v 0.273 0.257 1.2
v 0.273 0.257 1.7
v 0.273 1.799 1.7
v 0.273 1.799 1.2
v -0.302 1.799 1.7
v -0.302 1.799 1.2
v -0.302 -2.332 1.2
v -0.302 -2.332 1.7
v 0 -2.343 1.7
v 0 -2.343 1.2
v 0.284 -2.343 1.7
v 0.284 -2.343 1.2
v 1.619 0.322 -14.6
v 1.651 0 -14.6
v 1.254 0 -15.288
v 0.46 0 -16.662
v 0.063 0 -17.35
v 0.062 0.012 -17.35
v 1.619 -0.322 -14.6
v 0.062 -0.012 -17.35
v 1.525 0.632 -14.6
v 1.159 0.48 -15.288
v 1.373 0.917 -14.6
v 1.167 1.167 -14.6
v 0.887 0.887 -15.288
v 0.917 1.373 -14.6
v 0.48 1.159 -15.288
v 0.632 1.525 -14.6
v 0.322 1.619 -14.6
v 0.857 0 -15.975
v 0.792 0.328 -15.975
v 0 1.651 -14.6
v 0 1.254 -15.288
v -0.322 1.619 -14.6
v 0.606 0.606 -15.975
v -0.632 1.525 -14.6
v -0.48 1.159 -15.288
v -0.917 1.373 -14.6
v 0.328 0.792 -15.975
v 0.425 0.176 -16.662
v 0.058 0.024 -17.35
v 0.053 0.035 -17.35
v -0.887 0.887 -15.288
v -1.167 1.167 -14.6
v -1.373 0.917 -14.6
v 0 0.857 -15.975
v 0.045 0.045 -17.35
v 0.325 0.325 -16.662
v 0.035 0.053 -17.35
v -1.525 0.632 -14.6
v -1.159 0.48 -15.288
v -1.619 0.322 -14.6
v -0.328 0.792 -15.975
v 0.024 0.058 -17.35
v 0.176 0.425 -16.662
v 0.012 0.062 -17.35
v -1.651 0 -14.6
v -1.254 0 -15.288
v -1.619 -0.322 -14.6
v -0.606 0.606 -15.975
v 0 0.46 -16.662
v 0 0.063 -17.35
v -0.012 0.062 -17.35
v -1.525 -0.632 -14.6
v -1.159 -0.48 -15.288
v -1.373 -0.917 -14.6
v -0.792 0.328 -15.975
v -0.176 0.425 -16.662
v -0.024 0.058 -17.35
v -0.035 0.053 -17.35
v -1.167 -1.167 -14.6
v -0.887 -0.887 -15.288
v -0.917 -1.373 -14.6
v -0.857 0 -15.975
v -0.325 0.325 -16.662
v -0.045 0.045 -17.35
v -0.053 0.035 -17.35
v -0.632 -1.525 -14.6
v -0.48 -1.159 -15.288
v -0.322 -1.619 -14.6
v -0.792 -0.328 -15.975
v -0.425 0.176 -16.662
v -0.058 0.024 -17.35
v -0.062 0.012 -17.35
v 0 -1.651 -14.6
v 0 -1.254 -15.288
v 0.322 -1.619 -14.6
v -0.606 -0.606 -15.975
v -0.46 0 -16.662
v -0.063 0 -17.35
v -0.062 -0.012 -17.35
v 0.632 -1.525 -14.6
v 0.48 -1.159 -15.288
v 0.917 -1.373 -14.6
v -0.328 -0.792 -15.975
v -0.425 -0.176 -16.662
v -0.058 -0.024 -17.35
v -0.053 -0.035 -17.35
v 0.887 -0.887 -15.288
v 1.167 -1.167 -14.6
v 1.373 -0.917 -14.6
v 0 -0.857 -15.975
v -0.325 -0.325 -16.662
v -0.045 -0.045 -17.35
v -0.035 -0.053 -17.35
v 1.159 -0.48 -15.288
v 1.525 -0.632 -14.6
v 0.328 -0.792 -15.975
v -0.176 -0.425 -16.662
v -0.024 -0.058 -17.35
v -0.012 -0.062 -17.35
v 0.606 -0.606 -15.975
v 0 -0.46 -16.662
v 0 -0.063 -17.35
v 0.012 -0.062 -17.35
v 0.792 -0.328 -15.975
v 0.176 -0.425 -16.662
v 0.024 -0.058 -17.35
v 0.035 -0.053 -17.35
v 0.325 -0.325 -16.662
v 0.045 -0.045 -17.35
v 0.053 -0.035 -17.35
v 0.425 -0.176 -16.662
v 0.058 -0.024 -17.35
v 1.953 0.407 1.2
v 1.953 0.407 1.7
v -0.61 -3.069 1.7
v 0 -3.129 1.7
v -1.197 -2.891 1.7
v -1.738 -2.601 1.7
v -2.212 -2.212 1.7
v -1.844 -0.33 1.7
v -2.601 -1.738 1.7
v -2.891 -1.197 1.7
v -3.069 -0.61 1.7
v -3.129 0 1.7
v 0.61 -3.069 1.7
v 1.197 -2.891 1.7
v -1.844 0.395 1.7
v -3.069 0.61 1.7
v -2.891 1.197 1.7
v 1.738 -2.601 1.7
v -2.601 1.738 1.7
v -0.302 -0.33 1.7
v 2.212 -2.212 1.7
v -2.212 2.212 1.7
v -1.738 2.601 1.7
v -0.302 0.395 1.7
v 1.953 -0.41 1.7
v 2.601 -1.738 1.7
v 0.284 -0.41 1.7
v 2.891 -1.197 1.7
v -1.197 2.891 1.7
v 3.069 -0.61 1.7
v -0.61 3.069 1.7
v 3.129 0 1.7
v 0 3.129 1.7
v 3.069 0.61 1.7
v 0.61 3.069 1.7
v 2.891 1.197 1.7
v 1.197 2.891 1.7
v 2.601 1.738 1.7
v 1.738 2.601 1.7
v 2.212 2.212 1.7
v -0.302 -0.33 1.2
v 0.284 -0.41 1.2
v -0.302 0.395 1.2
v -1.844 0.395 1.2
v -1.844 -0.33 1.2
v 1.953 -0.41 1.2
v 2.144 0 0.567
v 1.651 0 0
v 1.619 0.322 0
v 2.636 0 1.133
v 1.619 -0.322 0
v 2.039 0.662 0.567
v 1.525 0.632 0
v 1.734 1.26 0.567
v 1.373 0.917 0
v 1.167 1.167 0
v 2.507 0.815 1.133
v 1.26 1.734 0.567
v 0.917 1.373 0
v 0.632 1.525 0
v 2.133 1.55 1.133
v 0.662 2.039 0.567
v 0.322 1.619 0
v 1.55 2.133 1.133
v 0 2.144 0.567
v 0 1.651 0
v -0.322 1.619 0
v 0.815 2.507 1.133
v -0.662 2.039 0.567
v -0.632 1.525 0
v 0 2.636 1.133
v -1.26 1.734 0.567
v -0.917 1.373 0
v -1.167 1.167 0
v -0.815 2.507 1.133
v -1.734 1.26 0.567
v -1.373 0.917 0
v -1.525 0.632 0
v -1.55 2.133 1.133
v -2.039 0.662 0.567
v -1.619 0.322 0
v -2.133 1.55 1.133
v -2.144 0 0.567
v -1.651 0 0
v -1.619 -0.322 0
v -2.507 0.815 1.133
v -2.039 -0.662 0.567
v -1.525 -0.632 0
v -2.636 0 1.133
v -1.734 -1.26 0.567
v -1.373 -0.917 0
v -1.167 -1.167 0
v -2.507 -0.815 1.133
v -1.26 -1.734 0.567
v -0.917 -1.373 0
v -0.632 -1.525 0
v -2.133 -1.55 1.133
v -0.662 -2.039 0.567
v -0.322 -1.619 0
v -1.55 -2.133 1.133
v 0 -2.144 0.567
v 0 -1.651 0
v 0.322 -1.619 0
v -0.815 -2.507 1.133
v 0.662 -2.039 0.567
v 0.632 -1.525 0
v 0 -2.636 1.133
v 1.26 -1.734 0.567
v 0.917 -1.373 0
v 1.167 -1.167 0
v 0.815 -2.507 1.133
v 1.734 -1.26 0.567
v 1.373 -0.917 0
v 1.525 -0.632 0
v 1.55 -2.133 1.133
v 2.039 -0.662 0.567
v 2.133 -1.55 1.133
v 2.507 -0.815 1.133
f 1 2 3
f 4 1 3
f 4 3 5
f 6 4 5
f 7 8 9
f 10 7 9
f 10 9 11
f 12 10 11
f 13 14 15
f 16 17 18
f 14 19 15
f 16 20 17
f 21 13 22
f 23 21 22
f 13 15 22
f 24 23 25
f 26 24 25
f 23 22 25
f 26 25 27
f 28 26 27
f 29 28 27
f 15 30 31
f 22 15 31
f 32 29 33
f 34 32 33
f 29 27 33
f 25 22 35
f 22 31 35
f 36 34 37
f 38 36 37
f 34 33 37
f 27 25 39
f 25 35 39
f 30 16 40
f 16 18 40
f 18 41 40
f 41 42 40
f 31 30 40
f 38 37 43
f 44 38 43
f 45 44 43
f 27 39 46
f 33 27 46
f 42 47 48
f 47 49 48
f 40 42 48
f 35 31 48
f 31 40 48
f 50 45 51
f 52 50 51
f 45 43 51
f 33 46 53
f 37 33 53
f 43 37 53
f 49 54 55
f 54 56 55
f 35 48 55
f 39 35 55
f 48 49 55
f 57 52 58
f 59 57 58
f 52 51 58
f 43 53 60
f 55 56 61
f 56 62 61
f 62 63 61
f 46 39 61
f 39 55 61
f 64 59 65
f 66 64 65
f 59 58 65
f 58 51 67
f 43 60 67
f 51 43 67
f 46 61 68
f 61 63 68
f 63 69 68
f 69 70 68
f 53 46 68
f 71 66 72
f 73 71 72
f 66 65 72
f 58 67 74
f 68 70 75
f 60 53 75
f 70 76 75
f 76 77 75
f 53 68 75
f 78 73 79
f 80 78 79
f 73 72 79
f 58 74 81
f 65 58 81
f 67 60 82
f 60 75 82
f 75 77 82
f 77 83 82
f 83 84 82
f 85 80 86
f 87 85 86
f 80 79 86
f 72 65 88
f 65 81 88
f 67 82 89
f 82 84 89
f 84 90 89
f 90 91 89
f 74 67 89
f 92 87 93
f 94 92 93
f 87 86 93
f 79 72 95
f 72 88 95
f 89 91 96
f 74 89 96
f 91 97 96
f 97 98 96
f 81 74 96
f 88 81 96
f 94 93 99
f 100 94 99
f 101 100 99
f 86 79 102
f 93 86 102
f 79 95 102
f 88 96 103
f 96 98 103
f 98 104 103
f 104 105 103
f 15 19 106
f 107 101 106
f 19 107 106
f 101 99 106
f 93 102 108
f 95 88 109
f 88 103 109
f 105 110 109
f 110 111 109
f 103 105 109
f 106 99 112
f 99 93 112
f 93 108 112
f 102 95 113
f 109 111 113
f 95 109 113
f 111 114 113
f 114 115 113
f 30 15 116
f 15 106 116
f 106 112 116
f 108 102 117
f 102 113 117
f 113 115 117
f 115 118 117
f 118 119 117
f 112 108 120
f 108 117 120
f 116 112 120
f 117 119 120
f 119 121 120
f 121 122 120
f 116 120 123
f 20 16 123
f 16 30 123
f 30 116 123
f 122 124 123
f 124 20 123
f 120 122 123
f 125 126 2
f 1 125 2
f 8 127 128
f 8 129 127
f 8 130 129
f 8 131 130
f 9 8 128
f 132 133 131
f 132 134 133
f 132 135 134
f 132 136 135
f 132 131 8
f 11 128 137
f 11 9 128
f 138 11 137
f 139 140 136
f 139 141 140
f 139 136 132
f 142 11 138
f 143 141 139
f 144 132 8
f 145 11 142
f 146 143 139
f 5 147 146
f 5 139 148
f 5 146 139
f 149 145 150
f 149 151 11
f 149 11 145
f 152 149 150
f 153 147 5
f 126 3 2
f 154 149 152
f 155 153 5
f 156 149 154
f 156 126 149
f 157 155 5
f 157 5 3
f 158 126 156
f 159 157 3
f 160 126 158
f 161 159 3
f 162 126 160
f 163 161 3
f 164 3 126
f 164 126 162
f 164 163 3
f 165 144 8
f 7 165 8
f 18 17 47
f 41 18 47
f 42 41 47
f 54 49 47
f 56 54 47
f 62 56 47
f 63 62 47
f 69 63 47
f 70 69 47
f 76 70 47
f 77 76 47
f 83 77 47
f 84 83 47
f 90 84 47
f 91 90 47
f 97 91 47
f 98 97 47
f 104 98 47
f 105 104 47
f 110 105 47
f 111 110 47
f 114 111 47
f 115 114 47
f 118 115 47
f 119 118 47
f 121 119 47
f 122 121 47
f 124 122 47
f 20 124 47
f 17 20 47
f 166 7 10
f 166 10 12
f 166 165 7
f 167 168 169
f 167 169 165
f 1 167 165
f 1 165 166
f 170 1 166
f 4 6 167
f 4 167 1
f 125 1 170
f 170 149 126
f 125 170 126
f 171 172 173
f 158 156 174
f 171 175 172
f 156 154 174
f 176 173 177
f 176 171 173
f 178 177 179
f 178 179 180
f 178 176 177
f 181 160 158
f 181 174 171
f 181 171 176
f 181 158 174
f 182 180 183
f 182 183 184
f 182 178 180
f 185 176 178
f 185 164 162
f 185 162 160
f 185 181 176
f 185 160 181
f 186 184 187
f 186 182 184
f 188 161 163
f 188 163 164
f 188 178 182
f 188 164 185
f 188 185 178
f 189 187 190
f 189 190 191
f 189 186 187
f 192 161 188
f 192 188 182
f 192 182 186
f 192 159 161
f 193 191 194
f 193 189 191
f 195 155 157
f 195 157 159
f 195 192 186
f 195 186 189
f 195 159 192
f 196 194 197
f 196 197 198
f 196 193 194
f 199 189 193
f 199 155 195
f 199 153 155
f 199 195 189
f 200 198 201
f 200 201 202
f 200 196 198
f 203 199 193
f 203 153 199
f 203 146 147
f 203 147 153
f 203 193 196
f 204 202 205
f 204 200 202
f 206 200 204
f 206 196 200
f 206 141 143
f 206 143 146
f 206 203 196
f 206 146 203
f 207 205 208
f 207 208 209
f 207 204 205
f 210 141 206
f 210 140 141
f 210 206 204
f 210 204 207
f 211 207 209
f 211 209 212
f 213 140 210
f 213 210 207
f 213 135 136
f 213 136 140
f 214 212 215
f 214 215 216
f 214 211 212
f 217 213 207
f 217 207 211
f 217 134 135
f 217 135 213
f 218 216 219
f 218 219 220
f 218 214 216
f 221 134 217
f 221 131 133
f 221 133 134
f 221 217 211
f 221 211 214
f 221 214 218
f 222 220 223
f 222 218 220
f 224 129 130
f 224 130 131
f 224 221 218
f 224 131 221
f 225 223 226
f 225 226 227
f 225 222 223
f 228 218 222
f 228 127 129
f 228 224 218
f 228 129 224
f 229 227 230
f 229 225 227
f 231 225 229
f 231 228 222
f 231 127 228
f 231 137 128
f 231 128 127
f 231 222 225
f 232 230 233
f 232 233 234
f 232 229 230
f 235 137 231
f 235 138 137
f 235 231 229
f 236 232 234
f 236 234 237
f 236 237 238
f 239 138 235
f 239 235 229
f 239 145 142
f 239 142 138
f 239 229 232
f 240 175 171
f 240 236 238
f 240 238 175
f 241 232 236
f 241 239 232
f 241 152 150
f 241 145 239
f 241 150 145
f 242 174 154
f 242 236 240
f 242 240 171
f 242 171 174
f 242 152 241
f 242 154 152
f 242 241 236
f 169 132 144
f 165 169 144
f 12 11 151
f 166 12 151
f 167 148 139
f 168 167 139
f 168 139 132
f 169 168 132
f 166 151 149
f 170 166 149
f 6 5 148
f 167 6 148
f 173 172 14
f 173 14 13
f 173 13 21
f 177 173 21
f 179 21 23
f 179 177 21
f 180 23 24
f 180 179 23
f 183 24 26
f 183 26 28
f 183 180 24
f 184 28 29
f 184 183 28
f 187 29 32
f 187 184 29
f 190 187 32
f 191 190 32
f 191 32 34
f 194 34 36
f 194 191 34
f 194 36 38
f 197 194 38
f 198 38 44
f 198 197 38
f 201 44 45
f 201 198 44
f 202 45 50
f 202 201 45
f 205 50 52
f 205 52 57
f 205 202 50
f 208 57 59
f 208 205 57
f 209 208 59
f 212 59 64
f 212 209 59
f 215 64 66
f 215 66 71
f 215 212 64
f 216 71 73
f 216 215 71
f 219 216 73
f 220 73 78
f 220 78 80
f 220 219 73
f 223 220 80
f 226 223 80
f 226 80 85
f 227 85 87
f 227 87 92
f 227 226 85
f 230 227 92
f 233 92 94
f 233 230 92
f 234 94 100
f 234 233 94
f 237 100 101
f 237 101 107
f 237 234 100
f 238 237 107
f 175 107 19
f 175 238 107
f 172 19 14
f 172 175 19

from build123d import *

# Parameters (mm, degrees)
F0_R     = 1.651
F1_DEPTH = 1.7
F1_TAPER = -41
F3_DEPTH = 17.35
F4_SIZE2 = 1.5877132403
F4_SIZE  = 2.75
F6_DEPTH = 0.5


with BuildPart() as f1:
    # F0 (on Top) → F1 (new body)
    with BuildSketch(Plane.XY):
        Circle(F0_R)
    extrude(amount=F1_DEPTH, taper=F1_TAPER)

    # F3 (add, through all): a face of the model
    f3_faces = [f1.faces().sort_by_distance(p)[0] for p in [
        (0, 0, 0),
    ]]
    extrude(f3_faces, amount=F3_DEPTH)

    # F4
    f4_edges = [f1.edges().sort_by_distance(p)[0] for p in [
        (-1.651, 0, -17.35),
    ]]
    f4_side = f1.faces().sort_by_distance((-1.651, 0, -8.675))[0]
    chamfer(f4_edges, length=F4_SIZE, length2=F4_SIZE2, reference=f4_side)

    # F5 (on face) → F6 (cut)
    with BuildSketch(Plane.XY.offset(1.7)):
        Polygon((-0.3023856843, -2.3319076281), (0, -2.3434136529), (0.2844197443, -2.3434136529), (0.2844197443, -0.4104074033), (1.9527882105, -0.4104074033), (1.9527882105, 0.40651788), (0.2729137486, 0.2569399949), (0.2729137486, 1.7987425672), (-0.3023856843, 1.7987425672), (-0.3023856843, 0.3950118844), (-1.8441881984, 0.3950118844), (-1.8441881984, -0.3298654919), (-0.3023856843, -0.3298654919), align=None)
    extrude(amount=-F6_DEPTH, mode=Mode.SUBTRACT)


solid = f1.part
